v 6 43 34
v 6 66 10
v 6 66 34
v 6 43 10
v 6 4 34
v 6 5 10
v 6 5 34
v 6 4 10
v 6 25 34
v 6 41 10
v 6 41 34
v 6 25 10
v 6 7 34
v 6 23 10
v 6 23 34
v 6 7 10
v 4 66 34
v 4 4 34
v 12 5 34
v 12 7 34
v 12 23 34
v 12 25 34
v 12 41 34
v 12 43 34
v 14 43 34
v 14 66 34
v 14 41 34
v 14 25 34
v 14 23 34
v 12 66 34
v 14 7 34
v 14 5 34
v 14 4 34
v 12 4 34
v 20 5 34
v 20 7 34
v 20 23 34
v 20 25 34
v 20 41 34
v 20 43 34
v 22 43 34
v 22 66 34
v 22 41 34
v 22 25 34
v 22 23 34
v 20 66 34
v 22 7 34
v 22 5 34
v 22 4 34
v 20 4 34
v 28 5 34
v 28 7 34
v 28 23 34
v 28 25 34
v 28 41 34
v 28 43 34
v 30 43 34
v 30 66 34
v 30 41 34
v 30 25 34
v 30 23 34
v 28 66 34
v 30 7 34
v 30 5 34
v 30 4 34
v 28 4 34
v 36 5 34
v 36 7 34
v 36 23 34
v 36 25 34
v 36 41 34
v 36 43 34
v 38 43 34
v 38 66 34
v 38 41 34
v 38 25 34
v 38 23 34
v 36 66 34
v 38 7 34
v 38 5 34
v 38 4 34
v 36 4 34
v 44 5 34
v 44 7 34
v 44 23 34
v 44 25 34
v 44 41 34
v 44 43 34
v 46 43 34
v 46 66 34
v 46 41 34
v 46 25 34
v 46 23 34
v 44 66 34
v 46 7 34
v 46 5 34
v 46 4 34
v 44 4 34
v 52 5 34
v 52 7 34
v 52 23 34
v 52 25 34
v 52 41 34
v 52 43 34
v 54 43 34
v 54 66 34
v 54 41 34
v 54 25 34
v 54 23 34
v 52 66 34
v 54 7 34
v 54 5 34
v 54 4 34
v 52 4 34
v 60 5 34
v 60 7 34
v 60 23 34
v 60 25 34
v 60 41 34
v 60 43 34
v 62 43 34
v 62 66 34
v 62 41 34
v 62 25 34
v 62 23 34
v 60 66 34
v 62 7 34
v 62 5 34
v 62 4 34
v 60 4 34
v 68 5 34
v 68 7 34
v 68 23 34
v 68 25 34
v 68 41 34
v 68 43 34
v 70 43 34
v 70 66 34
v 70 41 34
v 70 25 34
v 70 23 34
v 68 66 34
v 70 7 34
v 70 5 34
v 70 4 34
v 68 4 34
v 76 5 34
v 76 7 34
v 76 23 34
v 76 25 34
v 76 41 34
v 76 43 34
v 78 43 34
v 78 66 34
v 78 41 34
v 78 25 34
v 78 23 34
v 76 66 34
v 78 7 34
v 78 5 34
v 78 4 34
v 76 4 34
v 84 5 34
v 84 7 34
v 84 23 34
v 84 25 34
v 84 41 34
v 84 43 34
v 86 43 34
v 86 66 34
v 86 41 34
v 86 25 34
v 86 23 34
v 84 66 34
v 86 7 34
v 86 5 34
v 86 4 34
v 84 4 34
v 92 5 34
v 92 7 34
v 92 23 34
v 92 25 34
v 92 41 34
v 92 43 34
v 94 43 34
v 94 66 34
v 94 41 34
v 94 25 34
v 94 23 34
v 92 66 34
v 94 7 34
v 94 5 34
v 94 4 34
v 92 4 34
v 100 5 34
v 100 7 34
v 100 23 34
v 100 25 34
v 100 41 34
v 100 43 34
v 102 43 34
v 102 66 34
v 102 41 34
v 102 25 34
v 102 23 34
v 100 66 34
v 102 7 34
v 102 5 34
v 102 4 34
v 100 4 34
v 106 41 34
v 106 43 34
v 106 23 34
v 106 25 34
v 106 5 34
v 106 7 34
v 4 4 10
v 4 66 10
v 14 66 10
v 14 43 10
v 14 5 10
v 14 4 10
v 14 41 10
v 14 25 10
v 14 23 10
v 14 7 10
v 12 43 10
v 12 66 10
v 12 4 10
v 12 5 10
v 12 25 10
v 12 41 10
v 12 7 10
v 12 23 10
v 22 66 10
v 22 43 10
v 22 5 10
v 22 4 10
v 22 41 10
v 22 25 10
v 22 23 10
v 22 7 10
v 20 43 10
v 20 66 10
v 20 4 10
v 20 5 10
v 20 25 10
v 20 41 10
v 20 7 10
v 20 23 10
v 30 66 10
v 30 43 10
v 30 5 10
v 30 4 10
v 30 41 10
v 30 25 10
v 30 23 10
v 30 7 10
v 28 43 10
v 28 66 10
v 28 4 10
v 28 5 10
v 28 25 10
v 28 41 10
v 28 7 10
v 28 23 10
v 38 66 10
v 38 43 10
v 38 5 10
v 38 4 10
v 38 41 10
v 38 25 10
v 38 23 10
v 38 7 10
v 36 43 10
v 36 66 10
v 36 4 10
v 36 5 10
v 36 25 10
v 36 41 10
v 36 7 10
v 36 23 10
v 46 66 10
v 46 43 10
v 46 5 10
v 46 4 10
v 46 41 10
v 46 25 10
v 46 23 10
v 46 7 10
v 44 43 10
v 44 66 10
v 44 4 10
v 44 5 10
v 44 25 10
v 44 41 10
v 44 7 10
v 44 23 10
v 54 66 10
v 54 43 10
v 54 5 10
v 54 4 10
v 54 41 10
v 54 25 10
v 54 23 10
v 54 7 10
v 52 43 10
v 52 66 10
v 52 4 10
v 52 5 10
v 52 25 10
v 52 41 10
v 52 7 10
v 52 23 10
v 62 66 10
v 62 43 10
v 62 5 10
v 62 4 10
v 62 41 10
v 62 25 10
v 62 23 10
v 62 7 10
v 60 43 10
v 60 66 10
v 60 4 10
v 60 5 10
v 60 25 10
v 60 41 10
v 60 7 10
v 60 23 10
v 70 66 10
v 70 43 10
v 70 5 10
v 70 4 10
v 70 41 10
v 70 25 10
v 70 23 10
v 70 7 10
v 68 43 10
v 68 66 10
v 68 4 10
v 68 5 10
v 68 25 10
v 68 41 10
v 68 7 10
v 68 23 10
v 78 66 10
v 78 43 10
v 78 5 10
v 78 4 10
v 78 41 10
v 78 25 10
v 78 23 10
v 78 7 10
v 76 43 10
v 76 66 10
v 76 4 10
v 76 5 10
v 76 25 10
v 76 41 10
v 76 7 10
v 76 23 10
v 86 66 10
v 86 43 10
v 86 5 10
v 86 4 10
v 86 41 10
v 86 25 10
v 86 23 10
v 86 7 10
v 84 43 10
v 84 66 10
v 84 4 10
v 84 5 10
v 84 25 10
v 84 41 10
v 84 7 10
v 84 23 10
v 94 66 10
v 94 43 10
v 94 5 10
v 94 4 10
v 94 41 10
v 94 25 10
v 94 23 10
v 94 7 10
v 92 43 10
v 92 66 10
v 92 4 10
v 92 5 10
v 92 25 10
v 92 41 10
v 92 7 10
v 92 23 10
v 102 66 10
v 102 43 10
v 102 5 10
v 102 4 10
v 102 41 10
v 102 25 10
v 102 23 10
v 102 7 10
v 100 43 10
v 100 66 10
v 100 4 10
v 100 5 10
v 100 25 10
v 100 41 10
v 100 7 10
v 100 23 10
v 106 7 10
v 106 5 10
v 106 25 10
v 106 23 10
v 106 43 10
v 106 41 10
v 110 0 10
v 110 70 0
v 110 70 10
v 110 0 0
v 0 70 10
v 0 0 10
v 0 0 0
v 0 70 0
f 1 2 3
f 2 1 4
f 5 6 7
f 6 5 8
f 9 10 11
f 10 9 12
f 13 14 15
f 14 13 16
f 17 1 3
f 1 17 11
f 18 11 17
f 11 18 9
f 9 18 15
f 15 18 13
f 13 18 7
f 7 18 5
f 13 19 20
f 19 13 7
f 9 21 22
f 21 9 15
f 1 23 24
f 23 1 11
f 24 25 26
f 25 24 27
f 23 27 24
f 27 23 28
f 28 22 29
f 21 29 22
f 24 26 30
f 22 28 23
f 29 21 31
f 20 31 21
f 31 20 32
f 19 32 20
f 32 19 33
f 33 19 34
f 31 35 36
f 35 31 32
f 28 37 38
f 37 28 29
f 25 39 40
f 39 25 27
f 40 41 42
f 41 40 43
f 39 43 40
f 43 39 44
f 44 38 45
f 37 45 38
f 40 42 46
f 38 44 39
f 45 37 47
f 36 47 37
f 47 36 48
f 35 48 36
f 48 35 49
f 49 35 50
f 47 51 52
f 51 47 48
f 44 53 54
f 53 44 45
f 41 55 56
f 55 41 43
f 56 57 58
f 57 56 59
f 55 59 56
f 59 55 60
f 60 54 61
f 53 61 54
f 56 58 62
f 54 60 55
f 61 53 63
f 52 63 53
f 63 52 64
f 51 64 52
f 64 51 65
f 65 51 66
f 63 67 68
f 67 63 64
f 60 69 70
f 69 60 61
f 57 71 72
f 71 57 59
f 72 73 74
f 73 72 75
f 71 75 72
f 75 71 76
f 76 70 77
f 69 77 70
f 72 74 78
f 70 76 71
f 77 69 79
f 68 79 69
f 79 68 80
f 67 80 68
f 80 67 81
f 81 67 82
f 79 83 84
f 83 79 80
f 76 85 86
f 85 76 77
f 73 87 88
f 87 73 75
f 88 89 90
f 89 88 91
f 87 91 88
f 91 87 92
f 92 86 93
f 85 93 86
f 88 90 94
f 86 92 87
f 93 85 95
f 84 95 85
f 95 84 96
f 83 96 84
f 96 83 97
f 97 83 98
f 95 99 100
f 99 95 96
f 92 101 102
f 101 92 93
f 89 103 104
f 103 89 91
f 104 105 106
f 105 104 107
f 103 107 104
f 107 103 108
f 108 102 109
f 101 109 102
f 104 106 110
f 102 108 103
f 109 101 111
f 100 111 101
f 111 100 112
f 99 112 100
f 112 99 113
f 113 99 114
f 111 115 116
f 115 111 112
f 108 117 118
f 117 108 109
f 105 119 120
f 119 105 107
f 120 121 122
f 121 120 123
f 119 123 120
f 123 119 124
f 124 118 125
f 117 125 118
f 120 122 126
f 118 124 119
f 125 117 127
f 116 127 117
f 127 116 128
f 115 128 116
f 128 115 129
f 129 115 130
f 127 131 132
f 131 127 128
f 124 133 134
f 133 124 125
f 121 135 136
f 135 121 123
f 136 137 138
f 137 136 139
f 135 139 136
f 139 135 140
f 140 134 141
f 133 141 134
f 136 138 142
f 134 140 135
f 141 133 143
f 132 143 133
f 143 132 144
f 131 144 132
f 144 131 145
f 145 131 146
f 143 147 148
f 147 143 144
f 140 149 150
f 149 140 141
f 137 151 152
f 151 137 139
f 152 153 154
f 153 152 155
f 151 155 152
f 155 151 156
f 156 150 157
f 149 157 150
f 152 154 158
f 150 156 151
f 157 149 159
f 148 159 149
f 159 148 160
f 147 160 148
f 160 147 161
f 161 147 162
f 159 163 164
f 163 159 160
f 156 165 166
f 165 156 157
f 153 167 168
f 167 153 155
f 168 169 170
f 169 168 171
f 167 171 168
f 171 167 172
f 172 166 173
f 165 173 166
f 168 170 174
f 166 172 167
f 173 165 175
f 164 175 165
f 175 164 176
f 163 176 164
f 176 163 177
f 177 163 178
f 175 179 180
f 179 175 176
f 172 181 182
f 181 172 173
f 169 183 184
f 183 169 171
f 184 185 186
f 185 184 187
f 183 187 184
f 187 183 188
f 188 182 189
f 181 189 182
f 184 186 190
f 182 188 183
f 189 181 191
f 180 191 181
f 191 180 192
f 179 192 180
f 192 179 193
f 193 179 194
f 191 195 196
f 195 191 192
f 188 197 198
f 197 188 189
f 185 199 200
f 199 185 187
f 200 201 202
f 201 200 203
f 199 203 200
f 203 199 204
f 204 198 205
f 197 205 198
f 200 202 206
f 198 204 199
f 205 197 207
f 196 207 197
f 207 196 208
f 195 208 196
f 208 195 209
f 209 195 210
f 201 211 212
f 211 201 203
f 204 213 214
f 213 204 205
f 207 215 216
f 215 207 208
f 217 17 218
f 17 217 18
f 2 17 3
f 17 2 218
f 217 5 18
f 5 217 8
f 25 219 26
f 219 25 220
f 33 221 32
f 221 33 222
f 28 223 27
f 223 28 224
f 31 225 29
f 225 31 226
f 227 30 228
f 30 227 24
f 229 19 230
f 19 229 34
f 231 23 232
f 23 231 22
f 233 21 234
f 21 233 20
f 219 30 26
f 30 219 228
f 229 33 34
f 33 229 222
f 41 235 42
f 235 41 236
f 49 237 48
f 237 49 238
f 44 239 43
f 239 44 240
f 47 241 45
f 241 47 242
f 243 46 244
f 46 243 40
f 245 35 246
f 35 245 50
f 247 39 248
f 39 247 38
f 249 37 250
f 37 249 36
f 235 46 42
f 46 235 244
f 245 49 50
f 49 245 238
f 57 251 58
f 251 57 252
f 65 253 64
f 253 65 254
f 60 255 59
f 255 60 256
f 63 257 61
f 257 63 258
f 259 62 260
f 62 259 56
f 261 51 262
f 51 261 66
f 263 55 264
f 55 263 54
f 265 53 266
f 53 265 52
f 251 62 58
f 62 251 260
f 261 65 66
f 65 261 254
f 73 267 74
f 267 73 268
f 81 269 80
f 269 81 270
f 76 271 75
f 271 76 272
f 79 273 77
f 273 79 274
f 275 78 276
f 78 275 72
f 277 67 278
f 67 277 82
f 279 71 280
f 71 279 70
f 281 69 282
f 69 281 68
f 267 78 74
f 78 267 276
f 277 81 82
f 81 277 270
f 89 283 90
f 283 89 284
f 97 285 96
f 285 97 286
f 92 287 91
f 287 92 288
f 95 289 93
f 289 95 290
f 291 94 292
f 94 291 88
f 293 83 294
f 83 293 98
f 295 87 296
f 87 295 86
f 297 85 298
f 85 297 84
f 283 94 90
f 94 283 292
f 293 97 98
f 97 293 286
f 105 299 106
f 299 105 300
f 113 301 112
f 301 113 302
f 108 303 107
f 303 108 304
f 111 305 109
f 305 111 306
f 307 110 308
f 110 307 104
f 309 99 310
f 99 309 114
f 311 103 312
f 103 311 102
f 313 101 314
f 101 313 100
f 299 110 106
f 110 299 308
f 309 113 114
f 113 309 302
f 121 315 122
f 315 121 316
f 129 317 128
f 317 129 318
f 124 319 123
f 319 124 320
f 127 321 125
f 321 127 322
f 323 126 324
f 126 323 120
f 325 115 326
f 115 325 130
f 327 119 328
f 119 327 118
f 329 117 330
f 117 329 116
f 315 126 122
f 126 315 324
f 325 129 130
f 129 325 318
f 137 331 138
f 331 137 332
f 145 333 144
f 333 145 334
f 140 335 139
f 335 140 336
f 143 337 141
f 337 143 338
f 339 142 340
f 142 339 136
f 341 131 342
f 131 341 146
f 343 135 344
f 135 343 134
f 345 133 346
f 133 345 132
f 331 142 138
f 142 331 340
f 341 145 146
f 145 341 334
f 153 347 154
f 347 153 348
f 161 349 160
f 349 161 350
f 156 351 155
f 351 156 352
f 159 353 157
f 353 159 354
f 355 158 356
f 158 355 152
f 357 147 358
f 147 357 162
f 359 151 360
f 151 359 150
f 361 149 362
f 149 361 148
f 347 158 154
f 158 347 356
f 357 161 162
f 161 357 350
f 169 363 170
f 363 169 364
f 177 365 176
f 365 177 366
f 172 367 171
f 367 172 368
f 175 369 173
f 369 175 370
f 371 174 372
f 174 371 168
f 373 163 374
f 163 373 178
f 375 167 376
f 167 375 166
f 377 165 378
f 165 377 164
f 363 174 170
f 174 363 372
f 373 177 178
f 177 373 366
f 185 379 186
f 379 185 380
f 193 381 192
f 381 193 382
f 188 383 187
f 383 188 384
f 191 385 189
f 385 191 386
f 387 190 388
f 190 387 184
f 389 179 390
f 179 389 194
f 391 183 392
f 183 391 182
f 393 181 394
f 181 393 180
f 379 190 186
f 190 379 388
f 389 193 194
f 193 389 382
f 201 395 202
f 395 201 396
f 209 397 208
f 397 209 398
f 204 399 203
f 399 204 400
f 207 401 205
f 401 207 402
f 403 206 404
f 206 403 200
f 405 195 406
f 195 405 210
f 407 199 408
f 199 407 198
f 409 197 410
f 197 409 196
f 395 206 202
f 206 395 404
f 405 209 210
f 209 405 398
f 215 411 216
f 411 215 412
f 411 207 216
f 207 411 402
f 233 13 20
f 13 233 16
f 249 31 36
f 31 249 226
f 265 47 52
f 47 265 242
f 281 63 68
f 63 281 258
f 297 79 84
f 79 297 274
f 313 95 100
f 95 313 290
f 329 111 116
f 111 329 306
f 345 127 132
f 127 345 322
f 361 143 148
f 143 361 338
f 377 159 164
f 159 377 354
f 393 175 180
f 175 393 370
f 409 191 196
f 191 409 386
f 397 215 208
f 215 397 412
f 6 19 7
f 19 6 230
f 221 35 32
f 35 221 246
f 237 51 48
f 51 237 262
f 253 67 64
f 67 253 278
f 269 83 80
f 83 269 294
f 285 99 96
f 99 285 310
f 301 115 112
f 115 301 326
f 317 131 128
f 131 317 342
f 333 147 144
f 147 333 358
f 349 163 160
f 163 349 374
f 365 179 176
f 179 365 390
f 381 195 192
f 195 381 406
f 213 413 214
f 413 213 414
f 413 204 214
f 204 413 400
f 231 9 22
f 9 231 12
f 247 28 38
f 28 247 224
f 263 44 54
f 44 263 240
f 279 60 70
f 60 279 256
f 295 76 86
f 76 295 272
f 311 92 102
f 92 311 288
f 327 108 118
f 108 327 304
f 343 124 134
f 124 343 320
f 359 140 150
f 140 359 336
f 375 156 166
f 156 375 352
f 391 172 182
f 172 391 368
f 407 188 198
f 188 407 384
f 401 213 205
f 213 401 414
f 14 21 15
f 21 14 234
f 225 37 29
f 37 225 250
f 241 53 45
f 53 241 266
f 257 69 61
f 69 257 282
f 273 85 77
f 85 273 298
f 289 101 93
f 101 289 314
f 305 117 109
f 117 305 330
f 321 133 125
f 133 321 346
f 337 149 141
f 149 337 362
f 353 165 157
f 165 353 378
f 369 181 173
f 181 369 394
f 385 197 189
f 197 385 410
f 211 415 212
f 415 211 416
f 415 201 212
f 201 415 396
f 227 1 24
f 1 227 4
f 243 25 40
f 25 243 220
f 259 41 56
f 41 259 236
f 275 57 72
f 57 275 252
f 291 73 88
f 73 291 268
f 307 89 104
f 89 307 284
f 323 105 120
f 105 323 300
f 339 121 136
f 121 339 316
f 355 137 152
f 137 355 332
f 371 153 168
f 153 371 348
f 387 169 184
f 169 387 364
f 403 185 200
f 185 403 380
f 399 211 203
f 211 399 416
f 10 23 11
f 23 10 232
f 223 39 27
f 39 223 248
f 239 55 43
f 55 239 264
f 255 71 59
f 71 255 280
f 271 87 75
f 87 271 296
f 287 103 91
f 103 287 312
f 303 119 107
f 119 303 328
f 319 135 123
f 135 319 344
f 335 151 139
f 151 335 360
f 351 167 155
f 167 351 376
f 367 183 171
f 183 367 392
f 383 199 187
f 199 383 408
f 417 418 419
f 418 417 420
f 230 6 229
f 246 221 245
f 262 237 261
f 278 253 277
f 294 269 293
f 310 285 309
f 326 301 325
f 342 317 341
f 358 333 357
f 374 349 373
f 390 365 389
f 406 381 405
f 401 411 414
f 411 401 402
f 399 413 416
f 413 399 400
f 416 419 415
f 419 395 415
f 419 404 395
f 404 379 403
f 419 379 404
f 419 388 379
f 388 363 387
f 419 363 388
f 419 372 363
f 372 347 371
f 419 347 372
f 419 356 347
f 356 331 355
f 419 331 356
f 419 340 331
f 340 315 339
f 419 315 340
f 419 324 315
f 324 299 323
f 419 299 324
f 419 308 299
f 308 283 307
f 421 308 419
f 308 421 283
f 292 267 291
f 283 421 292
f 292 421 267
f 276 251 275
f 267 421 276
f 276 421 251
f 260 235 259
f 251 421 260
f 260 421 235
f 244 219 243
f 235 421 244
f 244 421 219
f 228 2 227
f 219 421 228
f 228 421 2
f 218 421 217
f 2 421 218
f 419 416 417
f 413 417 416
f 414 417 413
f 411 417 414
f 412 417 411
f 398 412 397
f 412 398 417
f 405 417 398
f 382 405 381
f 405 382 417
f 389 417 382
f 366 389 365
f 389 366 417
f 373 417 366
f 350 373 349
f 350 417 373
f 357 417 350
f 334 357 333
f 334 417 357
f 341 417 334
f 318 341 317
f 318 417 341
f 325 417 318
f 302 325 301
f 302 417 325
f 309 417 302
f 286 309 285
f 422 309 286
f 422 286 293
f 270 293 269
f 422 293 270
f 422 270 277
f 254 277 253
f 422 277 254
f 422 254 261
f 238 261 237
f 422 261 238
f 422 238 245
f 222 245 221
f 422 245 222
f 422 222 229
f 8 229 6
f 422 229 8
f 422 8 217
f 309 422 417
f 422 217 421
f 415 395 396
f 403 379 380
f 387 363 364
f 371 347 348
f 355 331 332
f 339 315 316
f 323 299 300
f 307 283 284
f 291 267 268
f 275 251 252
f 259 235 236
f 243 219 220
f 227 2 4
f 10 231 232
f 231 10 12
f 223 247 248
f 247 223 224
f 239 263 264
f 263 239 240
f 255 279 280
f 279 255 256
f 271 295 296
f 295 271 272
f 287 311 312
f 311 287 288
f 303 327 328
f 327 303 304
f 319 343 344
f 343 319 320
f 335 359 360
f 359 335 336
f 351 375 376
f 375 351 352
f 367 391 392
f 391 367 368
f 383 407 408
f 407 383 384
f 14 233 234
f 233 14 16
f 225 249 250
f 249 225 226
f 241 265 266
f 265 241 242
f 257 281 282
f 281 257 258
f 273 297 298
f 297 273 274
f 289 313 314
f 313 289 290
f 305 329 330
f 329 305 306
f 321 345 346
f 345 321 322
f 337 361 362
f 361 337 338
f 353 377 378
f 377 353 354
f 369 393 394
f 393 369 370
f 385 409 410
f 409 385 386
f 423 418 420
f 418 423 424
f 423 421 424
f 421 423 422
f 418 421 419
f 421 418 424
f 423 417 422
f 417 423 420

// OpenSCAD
$fn = 32;

// ----------------------------------------------------------------------
// Heatsink: cross fin block
// ----------------------------------------------------------------------

// --- parameters (mm) ---
base_l = 110;             // base length, X
base_w = 70;              // base width, Y
base_t = 10;              // base plate thickness
fin_h = 25;               // fin height above the base
fin_t = 2;                // fin thickness
edge = 4;                 // margin from the base ends
pitch = 8;                // fin pitch
rib_pitch = 18;           // cross rib pitch

n_fins = floor((base_l - 2 * edge - fin_t) / pitch) + 1;  // fin count
total_h = base_t + fin_h - 1;  // overall height
n_ribs = floor((base_w - 2 * edge) / rib_pitch);  // rib count

union() {
  cube([base_l, base_w, base_t]);
  for (i = [0 : n_fins - 1])
    translate([edge + i * pitch, edge, base_t - 1])
      cube([fin_t, base_w - 2 * edge, fin_h]);
  for (i = [0 : n_ribs - 1])
    translate([edge, edge + 1 + i * rib_pitch, base_t - 1])
      cube([base_l - 2 * edge, fin_t, fin_h]);
}
